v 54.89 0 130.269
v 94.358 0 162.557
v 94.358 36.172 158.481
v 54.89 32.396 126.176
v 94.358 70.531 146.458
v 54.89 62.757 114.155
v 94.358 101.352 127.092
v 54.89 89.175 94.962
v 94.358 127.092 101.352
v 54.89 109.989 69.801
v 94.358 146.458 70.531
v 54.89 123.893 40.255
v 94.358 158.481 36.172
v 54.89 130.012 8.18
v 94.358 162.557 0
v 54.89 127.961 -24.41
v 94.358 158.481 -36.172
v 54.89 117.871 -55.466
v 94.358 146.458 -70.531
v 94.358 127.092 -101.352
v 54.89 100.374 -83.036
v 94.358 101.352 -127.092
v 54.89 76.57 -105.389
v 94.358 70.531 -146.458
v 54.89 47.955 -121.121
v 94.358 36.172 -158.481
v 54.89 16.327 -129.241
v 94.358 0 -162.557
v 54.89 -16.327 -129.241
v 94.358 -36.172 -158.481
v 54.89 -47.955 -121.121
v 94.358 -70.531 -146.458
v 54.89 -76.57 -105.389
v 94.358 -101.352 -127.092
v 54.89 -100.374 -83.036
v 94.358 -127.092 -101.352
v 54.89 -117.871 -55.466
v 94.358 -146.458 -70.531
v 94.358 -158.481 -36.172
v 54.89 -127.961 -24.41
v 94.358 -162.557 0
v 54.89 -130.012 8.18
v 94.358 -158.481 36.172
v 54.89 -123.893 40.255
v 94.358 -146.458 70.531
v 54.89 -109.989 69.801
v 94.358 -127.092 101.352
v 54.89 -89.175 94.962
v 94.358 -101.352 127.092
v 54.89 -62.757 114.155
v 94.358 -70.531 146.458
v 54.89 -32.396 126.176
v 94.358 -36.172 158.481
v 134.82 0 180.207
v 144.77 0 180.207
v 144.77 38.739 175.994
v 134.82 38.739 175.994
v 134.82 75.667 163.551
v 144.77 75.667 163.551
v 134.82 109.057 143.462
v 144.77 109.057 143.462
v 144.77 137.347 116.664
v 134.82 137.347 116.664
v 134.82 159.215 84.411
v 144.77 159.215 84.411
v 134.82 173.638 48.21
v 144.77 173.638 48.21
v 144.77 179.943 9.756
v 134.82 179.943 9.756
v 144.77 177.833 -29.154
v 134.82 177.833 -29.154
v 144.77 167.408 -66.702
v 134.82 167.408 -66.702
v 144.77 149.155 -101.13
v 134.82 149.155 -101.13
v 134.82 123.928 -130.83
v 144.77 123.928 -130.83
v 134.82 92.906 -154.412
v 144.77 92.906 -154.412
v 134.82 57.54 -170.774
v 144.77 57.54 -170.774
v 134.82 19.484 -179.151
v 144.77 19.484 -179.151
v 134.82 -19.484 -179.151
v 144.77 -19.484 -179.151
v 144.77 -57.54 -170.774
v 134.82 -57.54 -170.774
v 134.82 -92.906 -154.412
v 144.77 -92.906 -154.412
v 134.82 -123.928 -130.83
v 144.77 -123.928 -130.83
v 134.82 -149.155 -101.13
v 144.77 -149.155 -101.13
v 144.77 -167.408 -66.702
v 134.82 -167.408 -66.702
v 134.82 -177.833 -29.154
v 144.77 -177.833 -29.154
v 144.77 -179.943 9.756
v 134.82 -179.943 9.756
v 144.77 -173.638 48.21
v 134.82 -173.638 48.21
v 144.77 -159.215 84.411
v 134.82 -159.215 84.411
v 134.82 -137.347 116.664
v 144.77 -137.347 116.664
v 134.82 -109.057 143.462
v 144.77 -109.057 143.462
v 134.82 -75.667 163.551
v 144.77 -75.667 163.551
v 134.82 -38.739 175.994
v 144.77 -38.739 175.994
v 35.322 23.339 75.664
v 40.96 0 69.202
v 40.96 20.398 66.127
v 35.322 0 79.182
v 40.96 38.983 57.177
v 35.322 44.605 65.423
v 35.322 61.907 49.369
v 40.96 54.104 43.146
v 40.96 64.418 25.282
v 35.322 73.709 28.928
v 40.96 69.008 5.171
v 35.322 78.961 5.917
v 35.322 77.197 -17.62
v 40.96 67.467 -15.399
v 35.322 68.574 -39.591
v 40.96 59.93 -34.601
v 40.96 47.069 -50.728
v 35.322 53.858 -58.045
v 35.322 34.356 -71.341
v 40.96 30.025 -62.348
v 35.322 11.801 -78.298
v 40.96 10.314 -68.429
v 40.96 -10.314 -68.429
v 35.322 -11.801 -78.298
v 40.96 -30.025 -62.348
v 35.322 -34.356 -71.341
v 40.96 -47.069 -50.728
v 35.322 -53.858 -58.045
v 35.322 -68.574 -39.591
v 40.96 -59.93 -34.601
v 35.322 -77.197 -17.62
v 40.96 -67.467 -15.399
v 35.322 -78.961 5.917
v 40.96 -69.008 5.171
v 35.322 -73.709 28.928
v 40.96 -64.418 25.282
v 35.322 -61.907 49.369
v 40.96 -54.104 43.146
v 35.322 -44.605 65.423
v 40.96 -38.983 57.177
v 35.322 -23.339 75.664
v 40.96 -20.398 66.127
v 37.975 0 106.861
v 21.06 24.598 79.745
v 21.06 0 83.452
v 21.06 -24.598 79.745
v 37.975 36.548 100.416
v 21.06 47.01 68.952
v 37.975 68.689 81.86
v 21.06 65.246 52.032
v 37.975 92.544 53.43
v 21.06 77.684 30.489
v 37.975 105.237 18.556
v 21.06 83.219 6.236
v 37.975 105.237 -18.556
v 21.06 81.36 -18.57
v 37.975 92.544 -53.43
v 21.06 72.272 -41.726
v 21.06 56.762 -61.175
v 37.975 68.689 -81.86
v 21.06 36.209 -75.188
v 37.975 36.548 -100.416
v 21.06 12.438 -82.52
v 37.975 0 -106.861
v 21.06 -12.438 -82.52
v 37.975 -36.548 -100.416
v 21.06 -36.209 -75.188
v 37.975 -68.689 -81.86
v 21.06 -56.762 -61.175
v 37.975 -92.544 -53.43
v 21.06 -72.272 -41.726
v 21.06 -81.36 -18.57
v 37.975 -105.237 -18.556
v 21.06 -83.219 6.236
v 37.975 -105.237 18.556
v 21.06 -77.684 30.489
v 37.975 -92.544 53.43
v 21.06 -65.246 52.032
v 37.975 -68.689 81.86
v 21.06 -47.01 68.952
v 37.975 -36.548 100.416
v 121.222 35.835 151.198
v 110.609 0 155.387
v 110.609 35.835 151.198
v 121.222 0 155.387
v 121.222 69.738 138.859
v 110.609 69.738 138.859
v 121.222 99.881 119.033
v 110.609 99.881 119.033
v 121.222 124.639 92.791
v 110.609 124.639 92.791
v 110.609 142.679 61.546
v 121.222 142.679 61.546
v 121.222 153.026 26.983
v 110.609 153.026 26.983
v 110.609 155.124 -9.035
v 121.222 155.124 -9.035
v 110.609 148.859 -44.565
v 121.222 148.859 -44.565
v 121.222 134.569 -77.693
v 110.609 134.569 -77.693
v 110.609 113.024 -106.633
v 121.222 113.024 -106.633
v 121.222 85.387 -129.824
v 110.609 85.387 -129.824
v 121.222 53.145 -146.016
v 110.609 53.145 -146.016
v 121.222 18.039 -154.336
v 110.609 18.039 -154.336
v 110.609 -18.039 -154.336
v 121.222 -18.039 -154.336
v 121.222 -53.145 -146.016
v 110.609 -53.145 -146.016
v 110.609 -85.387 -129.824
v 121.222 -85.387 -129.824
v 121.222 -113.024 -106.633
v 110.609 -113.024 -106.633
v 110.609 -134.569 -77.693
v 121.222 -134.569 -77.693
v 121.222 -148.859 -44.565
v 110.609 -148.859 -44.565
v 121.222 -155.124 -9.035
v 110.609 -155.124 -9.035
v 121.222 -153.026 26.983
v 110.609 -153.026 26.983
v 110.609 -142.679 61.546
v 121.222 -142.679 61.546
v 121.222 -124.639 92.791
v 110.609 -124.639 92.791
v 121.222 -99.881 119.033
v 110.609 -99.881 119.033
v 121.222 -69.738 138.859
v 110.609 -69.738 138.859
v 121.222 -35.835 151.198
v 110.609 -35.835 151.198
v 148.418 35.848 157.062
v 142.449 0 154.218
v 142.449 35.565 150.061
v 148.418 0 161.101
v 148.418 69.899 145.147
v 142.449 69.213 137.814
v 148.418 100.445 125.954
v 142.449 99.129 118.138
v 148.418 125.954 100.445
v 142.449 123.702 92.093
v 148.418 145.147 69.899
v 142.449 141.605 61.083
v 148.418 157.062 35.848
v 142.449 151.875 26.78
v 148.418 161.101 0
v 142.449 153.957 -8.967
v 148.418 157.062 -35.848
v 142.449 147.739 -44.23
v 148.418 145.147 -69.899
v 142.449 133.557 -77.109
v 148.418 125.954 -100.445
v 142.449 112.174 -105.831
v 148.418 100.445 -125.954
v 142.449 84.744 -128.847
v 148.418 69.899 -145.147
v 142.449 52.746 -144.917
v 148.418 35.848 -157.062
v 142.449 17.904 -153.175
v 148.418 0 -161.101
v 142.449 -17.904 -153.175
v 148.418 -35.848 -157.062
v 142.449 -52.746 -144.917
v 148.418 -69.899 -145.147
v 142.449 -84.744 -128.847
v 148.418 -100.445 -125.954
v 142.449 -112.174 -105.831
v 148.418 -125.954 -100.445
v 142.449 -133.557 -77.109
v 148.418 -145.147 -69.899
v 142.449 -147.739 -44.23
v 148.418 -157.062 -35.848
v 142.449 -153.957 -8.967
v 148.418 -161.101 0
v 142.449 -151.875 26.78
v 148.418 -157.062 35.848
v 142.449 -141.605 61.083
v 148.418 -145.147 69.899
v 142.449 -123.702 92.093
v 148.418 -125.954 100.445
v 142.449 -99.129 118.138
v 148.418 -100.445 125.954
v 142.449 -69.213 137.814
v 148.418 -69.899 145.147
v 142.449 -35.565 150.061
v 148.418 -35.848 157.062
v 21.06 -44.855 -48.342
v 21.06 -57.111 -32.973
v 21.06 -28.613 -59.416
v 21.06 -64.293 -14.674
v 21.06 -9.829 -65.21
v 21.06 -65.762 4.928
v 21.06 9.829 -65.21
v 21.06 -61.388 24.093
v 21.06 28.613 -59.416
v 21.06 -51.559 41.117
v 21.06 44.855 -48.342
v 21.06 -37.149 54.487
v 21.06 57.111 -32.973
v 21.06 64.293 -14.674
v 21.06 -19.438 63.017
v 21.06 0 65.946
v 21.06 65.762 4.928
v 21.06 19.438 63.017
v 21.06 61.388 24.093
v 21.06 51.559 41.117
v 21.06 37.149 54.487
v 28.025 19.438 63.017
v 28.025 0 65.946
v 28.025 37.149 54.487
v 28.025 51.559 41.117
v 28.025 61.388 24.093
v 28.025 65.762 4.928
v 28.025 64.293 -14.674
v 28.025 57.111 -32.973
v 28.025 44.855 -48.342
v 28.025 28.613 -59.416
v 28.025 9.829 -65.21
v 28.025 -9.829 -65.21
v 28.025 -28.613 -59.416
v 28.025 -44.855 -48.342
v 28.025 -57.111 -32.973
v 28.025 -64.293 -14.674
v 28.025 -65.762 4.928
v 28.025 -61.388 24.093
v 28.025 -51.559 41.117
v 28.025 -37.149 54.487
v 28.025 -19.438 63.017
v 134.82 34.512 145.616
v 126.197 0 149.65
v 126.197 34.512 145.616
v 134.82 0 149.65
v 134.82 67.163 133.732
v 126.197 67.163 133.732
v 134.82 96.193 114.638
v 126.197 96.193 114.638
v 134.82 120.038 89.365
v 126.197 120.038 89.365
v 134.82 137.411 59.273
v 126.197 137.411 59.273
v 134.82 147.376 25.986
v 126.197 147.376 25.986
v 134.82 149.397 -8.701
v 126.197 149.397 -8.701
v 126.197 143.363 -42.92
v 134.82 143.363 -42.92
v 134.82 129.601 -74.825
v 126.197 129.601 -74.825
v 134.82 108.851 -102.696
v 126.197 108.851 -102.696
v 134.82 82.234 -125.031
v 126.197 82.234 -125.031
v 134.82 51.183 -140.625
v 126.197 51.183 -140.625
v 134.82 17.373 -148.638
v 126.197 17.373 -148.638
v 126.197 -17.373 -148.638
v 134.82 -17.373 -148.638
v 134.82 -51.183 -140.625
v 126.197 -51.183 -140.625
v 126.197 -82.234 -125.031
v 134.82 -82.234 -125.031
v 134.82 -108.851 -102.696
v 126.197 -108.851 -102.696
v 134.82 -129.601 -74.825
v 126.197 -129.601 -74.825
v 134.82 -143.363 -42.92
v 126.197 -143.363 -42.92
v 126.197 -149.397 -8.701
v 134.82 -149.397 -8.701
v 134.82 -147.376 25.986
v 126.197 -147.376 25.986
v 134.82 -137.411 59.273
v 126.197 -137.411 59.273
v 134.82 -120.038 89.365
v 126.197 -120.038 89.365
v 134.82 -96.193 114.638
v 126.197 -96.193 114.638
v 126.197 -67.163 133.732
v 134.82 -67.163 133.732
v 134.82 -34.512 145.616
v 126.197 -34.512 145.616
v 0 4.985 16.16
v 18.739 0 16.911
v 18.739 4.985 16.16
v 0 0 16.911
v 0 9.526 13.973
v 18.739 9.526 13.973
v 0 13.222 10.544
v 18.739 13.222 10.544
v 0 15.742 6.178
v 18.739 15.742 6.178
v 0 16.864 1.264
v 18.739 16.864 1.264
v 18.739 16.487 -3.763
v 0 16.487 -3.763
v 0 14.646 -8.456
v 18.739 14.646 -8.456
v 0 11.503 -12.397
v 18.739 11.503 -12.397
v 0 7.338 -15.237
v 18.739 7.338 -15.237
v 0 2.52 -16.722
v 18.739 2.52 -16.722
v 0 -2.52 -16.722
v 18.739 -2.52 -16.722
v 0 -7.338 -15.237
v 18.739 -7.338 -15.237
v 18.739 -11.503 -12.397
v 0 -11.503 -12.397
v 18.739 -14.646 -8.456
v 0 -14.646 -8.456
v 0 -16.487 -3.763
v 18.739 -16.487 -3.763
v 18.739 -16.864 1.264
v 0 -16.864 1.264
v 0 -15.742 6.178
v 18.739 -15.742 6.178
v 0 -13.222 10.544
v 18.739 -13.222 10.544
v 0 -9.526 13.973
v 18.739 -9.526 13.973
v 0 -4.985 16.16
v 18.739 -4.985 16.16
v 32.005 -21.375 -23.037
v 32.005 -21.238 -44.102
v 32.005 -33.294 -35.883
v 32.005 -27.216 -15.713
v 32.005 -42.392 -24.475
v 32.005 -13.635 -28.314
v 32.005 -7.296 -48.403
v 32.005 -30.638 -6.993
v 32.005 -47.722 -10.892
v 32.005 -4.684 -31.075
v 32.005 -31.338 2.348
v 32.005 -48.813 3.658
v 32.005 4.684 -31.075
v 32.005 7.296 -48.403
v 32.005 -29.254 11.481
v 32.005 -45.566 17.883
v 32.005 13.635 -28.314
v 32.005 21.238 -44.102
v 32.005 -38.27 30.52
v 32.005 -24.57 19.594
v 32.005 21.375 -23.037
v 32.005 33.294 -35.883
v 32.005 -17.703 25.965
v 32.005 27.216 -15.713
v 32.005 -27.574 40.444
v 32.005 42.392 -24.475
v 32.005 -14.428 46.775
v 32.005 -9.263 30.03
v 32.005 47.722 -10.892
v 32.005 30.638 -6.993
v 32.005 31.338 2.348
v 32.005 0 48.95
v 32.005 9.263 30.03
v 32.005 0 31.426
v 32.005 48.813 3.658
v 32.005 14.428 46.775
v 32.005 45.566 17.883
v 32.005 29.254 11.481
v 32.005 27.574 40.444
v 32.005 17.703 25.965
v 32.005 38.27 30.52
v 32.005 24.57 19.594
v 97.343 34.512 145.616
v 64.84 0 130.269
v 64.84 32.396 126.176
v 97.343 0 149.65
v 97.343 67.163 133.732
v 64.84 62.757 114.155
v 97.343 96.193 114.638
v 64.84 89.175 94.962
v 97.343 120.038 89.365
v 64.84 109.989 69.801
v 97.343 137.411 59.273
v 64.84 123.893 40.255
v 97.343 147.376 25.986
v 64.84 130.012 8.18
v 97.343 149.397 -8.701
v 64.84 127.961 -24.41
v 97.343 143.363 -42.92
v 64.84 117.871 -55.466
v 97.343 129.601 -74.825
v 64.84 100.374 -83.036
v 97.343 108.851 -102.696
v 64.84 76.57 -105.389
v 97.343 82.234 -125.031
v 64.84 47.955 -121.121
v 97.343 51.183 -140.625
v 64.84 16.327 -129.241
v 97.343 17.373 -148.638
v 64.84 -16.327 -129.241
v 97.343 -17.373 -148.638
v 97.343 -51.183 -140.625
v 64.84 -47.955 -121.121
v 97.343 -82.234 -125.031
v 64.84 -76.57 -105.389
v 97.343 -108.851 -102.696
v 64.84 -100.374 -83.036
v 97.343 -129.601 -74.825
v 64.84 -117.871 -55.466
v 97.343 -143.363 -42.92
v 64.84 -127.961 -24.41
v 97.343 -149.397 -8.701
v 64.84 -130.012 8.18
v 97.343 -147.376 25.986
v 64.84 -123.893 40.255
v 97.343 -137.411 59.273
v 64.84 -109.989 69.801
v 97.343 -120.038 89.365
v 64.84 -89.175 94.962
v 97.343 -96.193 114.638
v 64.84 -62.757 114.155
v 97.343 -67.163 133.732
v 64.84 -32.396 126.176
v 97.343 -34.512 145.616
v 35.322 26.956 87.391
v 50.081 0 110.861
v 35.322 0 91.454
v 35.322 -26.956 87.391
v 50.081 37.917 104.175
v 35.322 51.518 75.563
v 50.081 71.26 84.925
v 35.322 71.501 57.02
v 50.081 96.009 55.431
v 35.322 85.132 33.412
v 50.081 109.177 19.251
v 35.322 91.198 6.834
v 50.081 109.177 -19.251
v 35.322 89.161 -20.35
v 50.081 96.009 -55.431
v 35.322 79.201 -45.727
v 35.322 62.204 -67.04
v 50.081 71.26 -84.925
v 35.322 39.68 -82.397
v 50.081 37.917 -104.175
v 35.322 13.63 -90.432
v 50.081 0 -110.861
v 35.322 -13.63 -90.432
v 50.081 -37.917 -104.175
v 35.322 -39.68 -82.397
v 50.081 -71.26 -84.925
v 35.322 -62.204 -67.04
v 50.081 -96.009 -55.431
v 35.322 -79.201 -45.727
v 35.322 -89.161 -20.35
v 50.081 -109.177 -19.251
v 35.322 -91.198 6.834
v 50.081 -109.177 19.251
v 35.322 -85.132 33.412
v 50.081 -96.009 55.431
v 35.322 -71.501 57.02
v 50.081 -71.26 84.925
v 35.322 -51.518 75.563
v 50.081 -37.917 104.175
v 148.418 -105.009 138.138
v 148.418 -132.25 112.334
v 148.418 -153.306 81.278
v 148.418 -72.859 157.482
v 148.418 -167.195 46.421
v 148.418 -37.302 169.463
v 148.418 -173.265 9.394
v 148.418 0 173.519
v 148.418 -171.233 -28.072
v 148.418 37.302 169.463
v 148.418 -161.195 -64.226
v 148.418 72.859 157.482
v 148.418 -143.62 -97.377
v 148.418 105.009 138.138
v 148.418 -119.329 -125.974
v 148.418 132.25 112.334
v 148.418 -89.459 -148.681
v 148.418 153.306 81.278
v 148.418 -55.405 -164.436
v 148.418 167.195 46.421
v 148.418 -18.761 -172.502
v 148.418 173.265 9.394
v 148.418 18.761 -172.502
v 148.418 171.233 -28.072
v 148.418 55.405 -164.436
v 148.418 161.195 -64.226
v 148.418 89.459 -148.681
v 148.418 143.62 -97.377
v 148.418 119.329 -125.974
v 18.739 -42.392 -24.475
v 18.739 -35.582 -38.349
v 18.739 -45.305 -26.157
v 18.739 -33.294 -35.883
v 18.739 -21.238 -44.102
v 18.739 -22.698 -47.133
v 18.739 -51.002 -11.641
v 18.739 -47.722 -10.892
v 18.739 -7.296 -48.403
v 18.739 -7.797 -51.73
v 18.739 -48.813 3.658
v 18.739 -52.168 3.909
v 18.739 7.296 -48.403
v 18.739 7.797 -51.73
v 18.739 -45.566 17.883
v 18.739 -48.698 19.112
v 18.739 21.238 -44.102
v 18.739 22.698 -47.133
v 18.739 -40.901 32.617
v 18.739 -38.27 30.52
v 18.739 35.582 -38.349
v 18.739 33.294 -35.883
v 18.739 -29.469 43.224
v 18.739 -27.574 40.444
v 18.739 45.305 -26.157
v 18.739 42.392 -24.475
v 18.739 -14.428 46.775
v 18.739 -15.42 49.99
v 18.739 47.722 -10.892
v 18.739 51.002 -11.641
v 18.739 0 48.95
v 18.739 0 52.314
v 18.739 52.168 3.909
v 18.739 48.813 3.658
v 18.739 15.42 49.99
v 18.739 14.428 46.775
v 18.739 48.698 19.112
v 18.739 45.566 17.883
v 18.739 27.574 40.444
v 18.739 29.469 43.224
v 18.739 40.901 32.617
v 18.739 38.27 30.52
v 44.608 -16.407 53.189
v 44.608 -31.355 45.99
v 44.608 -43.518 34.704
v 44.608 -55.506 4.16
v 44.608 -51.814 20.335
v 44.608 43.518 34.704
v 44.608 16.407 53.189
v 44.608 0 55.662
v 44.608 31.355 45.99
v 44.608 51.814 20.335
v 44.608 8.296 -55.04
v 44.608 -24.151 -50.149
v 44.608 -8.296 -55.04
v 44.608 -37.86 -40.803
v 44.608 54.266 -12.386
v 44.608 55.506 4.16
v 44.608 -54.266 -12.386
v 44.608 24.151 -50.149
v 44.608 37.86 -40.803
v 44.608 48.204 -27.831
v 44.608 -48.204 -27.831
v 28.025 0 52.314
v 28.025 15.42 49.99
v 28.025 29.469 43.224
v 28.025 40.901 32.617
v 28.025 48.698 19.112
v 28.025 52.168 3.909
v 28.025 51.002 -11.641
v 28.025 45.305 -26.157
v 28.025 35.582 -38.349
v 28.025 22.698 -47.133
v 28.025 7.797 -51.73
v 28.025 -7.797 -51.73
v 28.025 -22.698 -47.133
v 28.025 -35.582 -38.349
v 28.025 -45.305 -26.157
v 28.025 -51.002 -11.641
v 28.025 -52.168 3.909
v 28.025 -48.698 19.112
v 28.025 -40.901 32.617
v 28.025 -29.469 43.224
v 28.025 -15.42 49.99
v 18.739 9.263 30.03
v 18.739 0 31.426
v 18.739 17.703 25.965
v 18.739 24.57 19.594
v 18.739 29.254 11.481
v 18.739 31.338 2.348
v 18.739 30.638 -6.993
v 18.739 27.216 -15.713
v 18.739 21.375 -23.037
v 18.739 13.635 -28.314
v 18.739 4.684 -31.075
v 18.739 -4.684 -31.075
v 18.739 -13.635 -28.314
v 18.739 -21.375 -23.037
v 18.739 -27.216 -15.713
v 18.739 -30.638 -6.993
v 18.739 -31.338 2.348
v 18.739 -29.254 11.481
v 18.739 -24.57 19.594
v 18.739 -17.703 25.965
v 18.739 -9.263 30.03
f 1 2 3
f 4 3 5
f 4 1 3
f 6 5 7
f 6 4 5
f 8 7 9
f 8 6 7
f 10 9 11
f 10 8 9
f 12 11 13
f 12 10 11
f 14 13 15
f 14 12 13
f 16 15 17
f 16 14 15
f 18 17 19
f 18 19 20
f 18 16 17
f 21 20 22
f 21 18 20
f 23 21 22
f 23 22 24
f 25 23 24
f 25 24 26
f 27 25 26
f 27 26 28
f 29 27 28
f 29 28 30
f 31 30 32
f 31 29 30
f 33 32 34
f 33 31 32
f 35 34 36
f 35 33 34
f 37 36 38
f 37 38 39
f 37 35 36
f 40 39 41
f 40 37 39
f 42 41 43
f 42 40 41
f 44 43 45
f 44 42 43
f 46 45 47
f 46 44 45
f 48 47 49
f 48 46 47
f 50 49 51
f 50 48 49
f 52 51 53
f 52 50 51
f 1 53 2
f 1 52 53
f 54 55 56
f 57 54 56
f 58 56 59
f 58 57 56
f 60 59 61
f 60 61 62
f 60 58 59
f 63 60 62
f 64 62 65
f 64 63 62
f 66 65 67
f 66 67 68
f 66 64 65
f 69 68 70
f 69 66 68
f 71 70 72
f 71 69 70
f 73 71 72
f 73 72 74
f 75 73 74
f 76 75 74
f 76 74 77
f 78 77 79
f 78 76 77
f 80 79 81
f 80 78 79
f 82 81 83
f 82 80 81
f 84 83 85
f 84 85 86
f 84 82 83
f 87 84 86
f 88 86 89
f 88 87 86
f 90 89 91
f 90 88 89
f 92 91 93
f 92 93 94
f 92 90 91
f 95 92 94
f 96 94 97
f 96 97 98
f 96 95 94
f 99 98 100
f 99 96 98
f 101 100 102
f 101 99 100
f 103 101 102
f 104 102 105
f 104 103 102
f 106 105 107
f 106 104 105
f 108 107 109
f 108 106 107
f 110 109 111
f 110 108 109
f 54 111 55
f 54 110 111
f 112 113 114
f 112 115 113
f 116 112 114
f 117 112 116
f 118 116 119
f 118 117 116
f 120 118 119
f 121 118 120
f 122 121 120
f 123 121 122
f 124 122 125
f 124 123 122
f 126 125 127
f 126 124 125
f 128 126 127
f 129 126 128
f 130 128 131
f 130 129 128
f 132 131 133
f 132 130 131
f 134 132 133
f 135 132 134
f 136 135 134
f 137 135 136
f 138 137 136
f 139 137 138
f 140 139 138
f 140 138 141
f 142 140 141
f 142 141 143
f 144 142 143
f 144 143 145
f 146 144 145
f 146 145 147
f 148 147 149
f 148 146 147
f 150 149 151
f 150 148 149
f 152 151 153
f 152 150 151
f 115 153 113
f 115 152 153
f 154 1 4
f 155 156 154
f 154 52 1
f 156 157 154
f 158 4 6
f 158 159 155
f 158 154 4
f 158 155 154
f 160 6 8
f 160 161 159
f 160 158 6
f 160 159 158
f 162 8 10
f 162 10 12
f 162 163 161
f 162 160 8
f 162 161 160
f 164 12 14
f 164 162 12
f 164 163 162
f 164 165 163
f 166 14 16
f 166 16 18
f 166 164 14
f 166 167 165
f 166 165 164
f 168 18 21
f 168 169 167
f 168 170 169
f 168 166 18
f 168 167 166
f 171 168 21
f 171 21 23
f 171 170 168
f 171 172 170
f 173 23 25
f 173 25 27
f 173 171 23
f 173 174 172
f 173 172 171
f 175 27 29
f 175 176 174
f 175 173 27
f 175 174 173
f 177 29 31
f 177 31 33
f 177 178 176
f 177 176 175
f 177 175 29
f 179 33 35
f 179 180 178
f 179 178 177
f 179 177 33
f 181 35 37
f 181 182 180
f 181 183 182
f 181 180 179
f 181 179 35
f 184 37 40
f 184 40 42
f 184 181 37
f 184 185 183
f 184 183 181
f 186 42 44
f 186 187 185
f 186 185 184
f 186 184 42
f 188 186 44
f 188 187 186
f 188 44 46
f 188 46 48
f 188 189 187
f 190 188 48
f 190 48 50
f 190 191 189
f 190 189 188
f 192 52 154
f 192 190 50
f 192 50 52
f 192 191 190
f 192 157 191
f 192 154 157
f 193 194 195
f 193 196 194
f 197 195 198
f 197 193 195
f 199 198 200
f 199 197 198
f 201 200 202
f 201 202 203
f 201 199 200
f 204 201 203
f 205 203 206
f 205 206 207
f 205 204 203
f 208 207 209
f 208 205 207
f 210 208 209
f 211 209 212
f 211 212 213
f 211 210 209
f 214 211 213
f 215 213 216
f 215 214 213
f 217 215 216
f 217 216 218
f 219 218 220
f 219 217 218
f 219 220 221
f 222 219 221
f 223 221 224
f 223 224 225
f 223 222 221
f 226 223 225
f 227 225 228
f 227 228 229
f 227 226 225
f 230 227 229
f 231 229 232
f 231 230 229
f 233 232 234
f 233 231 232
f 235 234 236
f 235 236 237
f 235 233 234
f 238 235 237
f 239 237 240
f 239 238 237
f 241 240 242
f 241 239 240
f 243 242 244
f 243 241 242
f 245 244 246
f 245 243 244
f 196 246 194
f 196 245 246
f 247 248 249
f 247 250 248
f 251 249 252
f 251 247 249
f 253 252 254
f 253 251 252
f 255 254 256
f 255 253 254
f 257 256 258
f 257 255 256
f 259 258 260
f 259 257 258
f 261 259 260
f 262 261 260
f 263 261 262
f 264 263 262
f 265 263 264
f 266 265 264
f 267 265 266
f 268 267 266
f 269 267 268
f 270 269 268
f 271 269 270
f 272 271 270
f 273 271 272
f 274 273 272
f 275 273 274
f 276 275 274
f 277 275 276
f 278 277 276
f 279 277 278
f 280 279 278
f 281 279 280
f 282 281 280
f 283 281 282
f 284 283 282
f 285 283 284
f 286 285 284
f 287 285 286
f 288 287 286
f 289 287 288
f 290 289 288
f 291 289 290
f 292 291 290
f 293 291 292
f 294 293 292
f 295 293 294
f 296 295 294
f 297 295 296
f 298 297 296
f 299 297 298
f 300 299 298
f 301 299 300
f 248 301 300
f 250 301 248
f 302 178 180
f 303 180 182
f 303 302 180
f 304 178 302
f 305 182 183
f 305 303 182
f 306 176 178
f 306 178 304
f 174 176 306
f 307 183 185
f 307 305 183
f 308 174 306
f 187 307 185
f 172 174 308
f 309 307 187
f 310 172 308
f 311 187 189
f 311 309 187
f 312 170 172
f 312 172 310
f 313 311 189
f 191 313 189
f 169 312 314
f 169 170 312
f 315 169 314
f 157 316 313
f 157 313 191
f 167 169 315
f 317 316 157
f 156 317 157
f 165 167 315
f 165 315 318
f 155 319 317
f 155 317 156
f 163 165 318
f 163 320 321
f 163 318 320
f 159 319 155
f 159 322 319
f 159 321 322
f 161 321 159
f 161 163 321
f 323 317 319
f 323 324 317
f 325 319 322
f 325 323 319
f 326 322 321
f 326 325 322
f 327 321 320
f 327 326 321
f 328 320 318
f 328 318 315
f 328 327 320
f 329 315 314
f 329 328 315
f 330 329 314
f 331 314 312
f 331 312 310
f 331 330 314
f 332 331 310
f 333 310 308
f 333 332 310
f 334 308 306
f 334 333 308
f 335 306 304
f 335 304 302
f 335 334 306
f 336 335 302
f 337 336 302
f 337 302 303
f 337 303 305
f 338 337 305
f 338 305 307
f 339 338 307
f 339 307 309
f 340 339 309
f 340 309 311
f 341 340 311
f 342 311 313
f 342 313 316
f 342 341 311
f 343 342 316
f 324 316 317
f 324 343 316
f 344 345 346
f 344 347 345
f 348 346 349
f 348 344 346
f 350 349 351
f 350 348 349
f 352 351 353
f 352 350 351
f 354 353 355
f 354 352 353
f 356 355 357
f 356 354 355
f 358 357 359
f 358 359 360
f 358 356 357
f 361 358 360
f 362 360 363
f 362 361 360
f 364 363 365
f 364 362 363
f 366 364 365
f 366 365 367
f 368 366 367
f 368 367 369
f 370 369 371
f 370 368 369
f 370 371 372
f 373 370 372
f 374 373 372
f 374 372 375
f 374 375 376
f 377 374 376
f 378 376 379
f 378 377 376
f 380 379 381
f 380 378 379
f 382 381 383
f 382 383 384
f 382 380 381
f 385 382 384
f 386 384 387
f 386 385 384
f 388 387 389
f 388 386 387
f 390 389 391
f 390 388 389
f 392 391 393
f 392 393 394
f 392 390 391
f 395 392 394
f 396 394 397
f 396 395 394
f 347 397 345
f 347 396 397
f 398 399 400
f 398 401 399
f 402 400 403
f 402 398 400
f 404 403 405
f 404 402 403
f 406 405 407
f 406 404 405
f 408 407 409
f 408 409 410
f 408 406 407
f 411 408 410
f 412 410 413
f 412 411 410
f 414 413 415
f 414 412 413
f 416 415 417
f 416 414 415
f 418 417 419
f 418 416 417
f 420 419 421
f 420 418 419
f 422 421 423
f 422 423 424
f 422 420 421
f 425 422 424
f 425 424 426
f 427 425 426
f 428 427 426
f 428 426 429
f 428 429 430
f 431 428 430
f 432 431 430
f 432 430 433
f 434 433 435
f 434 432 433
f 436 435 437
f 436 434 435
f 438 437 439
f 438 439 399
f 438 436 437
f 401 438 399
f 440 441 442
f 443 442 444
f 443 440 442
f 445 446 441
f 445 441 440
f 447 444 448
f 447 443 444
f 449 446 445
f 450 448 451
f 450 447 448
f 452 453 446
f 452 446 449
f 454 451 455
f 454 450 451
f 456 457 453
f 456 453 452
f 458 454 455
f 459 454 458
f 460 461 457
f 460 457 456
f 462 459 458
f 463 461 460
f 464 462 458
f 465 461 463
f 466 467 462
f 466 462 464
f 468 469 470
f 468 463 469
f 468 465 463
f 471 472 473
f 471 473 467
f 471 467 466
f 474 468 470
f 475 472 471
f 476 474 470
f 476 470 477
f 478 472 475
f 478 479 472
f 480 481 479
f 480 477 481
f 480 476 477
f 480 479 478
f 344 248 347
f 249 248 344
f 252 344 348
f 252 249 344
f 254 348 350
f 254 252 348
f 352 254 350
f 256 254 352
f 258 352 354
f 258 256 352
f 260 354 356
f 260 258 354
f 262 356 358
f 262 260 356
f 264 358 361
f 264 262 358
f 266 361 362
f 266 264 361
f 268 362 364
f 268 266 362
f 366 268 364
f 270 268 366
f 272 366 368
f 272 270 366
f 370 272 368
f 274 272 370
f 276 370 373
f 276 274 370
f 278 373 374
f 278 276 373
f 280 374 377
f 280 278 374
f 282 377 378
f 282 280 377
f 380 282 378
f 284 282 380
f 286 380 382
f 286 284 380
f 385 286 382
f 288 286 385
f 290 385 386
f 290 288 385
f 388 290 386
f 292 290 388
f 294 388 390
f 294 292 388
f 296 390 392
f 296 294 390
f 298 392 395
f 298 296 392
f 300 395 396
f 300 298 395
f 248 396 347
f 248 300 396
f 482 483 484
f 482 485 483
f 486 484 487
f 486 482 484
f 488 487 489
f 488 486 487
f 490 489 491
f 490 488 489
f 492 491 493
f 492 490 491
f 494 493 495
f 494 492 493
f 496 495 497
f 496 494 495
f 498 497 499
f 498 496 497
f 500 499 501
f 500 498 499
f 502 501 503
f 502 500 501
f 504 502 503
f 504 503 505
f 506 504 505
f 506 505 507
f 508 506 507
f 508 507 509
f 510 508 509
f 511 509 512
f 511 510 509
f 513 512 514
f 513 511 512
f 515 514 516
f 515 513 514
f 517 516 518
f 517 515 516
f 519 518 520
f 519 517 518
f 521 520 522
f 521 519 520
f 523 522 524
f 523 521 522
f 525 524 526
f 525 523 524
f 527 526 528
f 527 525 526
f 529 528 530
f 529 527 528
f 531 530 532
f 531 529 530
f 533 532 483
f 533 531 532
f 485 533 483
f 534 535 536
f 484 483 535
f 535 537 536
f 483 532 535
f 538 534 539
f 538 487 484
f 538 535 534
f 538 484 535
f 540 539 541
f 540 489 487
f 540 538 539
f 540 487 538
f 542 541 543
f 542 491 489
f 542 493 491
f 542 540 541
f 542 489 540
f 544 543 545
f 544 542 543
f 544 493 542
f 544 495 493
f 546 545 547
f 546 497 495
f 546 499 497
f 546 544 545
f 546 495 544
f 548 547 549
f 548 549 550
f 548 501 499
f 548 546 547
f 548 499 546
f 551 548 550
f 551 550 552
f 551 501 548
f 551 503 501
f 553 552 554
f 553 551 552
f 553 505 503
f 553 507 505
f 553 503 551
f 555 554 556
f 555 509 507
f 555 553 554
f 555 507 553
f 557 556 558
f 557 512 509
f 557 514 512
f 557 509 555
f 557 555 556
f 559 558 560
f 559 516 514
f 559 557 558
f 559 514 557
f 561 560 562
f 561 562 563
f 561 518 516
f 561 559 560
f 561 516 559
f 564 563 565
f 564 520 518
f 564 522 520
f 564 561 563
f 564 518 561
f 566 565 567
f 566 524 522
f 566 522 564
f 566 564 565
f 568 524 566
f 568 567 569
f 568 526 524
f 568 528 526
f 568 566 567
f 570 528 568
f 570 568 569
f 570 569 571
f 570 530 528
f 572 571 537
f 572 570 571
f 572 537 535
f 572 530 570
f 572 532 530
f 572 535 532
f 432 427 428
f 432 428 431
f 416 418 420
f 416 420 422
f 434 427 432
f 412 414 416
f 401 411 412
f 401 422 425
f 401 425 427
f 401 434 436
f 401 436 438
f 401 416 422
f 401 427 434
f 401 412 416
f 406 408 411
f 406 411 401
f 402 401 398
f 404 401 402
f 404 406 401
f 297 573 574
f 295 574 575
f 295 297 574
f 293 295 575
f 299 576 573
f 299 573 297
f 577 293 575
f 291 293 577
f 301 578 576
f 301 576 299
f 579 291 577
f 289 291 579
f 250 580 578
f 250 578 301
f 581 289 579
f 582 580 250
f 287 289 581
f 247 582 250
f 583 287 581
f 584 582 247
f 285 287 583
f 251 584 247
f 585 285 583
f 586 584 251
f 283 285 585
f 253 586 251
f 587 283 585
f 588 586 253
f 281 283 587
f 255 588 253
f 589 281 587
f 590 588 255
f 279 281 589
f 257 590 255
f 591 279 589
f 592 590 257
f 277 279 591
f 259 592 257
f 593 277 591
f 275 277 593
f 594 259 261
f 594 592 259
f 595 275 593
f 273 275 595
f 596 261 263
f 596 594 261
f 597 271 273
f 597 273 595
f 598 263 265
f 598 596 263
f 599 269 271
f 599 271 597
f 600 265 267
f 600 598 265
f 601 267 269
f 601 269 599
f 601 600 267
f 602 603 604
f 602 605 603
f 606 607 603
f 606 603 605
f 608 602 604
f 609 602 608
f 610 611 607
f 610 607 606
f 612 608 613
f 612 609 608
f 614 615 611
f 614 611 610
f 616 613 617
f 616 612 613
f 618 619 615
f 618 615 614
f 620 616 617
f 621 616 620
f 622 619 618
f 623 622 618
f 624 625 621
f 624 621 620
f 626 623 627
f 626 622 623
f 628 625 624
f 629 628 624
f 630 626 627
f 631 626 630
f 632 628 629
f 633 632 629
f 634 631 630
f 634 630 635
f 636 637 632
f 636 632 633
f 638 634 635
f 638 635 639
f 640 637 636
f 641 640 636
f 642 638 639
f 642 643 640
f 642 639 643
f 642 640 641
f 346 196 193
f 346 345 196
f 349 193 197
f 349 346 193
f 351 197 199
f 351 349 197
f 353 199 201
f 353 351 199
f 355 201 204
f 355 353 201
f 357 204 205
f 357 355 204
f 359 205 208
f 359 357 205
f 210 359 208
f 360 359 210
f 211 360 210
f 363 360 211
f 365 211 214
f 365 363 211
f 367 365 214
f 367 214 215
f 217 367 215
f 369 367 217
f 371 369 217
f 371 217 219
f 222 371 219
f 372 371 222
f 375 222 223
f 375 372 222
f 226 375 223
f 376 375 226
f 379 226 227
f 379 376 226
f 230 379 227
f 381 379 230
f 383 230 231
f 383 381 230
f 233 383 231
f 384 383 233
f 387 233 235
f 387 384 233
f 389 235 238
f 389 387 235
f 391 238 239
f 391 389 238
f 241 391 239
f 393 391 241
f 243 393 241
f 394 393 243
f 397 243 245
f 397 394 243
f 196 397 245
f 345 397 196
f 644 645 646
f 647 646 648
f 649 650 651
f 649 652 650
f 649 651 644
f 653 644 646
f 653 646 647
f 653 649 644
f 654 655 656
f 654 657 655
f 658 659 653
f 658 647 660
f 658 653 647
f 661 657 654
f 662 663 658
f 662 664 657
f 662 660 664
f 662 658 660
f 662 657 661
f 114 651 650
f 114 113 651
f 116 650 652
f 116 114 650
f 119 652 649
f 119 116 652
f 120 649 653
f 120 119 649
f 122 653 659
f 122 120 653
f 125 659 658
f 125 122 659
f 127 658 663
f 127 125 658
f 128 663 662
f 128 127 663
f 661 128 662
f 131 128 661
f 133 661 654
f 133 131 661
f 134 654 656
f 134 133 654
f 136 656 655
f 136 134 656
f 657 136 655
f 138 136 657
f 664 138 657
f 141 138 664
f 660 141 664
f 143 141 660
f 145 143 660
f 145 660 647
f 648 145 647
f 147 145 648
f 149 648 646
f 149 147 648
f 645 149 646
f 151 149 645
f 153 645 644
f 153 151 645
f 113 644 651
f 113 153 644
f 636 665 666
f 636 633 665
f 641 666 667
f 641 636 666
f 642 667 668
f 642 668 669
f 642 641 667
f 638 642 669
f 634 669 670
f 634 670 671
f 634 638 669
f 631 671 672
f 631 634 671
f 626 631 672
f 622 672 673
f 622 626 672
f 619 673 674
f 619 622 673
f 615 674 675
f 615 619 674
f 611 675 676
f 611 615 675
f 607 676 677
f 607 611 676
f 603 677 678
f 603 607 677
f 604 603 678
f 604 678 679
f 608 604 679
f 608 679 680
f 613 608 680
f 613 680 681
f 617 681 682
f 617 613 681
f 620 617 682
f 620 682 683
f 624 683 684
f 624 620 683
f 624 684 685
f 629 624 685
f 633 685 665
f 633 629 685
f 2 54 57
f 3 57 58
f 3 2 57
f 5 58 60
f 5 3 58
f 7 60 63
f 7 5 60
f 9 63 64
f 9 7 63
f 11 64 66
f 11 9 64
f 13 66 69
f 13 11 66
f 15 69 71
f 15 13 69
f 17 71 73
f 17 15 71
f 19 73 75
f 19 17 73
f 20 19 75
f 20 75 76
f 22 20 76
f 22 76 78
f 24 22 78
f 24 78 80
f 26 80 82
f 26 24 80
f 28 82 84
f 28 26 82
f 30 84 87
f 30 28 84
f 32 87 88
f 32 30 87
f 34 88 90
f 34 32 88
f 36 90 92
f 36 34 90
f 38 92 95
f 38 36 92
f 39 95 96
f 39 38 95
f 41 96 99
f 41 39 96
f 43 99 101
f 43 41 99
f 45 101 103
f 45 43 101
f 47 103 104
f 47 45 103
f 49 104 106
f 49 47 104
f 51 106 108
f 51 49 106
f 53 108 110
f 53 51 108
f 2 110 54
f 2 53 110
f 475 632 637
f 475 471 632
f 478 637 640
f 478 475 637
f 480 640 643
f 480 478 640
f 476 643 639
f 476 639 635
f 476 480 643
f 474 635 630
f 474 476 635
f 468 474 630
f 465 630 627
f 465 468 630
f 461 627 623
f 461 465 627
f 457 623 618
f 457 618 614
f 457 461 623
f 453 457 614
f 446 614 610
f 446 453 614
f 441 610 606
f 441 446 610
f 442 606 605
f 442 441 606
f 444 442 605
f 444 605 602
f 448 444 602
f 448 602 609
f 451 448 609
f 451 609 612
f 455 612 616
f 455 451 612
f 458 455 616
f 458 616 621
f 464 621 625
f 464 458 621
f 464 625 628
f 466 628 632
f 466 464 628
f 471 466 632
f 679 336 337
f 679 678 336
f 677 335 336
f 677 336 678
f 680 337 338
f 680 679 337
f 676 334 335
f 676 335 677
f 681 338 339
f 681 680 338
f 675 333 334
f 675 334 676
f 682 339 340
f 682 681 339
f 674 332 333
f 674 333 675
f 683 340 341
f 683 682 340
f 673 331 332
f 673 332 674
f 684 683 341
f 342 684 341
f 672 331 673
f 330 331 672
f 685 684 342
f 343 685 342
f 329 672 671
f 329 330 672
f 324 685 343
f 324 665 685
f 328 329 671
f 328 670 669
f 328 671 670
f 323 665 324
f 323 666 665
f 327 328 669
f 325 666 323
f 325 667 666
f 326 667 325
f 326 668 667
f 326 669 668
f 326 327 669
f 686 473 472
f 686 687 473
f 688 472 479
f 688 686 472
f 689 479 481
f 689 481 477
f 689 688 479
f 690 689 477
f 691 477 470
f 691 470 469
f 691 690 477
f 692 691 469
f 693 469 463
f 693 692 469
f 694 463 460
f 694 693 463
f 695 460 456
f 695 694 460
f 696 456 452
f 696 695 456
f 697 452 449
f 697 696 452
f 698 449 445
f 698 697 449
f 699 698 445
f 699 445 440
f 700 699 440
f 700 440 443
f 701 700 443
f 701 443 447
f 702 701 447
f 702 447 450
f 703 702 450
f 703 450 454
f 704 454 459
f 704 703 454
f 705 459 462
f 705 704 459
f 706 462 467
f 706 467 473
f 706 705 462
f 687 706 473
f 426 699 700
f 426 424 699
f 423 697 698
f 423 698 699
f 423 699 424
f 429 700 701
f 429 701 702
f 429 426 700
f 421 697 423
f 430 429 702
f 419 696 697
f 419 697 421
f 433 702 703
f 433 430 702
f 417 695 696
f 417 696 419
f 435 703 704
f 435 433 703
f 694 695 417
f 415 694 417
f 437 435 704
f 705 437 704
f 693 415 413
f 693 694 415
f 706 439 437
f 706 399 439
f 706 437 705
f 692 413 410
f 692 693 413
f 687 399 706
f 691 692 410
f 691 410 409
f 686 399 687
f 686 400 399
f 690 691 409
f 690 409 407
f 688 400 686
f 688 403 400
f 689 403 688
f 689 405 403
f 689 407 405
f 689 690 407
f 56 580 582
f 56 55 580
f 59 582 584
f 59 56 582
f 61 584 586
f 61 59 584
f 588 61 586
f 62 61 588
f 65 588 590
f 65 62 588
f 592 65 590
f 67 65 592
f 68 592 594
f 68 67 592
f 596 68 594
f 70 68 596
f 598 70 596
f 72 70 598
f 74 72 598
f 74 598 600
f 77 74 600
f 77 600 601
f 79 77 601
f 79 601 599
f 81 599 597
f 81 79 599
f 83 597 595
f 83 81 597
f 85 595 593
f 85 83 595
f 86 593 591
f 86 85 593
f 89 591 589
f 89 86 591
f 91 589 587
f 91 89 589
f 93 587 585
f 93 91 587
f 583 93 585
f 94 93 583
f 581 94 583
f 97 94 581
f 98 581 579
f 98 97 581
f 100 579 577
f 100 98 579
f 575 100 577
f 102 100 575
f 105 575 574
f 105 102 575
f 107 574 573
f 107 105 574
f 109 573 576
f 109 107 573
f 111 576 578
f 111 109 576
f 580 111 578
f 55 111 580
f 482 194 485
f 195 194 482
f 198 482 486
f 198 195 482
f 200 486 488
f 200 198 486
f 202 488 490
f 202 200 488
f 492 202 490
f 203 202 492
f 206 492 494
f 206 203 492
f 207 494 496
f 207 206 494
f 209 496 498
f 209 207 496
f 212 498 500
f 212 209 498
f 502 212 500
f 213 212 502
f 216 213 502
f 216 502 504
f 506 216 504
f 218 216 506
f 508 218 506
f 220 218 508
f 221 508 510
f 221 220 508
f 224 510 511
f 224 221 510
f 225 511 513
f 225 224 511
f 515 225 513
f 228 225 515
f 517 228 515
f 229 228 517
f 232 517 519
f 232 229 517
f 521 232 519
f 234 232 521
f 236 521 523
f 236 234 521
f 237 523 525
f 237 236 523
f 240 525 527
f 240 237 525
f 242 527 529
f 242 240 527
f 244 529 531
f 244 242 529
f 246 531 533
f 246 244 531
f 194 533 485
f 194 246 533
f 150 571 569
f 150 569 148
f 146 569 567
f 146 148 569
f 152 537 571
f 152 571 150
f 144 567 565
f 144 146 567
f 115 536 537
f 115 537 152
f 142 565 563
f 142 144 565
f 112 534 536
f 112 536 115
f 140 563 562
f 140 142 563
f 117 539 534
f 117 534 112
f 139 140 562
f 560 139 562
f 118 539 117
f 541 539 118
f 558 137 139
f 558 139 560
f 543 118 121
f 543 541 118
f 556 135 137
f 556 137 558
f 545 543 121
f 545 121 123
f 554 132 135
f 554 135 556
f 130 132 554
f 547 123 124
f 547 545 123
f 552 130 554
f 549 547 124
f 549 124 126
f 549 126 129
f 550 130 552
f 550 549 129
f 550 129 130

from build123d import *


with BuildPart() as f1:
    # F0 (on Front) → F1 (revolve)
    with BuildSketch(Plane.XZ):
        Polygon((0, 16.911296), (0, 0), (44.608466, 0), (44.608466, 21.264633), (44.608466, 38.319539), (44.608466, 55.661686), (40.960189, 69.201611), (35.32194, 79.182148), (35.32194, 91.453612), (64.839803, 130.268559), (97.342625, 149.649769), (110.609077, 155.38694), (121.22225, 155.38694), (126.197159, 149.649769), (134.820357, 149.649769), (142.448574, 154.217899), (148.418486, 161.100805), (148.418486, 173.519328), (144.770205, 180.207044), (134.820357, 180.207044), (94.357669, 162.556574), (54.889966, 130.268559), (21.0605, 83.4525), (21.0605, 65.94637), (28.025387, 65.94637), (28.025387, 52.313879), (18.738873, 52.313879), (18.738873, 48.949644), (32.005329, 48.949644), (32.005329, 31.426087), (18.738873, 31.426087), (18.738873, 16.911296), align=None)
    revolve(axis=Axis((22.304233, 0, 0), (-1, 0, 0)))


solid = f1.part
